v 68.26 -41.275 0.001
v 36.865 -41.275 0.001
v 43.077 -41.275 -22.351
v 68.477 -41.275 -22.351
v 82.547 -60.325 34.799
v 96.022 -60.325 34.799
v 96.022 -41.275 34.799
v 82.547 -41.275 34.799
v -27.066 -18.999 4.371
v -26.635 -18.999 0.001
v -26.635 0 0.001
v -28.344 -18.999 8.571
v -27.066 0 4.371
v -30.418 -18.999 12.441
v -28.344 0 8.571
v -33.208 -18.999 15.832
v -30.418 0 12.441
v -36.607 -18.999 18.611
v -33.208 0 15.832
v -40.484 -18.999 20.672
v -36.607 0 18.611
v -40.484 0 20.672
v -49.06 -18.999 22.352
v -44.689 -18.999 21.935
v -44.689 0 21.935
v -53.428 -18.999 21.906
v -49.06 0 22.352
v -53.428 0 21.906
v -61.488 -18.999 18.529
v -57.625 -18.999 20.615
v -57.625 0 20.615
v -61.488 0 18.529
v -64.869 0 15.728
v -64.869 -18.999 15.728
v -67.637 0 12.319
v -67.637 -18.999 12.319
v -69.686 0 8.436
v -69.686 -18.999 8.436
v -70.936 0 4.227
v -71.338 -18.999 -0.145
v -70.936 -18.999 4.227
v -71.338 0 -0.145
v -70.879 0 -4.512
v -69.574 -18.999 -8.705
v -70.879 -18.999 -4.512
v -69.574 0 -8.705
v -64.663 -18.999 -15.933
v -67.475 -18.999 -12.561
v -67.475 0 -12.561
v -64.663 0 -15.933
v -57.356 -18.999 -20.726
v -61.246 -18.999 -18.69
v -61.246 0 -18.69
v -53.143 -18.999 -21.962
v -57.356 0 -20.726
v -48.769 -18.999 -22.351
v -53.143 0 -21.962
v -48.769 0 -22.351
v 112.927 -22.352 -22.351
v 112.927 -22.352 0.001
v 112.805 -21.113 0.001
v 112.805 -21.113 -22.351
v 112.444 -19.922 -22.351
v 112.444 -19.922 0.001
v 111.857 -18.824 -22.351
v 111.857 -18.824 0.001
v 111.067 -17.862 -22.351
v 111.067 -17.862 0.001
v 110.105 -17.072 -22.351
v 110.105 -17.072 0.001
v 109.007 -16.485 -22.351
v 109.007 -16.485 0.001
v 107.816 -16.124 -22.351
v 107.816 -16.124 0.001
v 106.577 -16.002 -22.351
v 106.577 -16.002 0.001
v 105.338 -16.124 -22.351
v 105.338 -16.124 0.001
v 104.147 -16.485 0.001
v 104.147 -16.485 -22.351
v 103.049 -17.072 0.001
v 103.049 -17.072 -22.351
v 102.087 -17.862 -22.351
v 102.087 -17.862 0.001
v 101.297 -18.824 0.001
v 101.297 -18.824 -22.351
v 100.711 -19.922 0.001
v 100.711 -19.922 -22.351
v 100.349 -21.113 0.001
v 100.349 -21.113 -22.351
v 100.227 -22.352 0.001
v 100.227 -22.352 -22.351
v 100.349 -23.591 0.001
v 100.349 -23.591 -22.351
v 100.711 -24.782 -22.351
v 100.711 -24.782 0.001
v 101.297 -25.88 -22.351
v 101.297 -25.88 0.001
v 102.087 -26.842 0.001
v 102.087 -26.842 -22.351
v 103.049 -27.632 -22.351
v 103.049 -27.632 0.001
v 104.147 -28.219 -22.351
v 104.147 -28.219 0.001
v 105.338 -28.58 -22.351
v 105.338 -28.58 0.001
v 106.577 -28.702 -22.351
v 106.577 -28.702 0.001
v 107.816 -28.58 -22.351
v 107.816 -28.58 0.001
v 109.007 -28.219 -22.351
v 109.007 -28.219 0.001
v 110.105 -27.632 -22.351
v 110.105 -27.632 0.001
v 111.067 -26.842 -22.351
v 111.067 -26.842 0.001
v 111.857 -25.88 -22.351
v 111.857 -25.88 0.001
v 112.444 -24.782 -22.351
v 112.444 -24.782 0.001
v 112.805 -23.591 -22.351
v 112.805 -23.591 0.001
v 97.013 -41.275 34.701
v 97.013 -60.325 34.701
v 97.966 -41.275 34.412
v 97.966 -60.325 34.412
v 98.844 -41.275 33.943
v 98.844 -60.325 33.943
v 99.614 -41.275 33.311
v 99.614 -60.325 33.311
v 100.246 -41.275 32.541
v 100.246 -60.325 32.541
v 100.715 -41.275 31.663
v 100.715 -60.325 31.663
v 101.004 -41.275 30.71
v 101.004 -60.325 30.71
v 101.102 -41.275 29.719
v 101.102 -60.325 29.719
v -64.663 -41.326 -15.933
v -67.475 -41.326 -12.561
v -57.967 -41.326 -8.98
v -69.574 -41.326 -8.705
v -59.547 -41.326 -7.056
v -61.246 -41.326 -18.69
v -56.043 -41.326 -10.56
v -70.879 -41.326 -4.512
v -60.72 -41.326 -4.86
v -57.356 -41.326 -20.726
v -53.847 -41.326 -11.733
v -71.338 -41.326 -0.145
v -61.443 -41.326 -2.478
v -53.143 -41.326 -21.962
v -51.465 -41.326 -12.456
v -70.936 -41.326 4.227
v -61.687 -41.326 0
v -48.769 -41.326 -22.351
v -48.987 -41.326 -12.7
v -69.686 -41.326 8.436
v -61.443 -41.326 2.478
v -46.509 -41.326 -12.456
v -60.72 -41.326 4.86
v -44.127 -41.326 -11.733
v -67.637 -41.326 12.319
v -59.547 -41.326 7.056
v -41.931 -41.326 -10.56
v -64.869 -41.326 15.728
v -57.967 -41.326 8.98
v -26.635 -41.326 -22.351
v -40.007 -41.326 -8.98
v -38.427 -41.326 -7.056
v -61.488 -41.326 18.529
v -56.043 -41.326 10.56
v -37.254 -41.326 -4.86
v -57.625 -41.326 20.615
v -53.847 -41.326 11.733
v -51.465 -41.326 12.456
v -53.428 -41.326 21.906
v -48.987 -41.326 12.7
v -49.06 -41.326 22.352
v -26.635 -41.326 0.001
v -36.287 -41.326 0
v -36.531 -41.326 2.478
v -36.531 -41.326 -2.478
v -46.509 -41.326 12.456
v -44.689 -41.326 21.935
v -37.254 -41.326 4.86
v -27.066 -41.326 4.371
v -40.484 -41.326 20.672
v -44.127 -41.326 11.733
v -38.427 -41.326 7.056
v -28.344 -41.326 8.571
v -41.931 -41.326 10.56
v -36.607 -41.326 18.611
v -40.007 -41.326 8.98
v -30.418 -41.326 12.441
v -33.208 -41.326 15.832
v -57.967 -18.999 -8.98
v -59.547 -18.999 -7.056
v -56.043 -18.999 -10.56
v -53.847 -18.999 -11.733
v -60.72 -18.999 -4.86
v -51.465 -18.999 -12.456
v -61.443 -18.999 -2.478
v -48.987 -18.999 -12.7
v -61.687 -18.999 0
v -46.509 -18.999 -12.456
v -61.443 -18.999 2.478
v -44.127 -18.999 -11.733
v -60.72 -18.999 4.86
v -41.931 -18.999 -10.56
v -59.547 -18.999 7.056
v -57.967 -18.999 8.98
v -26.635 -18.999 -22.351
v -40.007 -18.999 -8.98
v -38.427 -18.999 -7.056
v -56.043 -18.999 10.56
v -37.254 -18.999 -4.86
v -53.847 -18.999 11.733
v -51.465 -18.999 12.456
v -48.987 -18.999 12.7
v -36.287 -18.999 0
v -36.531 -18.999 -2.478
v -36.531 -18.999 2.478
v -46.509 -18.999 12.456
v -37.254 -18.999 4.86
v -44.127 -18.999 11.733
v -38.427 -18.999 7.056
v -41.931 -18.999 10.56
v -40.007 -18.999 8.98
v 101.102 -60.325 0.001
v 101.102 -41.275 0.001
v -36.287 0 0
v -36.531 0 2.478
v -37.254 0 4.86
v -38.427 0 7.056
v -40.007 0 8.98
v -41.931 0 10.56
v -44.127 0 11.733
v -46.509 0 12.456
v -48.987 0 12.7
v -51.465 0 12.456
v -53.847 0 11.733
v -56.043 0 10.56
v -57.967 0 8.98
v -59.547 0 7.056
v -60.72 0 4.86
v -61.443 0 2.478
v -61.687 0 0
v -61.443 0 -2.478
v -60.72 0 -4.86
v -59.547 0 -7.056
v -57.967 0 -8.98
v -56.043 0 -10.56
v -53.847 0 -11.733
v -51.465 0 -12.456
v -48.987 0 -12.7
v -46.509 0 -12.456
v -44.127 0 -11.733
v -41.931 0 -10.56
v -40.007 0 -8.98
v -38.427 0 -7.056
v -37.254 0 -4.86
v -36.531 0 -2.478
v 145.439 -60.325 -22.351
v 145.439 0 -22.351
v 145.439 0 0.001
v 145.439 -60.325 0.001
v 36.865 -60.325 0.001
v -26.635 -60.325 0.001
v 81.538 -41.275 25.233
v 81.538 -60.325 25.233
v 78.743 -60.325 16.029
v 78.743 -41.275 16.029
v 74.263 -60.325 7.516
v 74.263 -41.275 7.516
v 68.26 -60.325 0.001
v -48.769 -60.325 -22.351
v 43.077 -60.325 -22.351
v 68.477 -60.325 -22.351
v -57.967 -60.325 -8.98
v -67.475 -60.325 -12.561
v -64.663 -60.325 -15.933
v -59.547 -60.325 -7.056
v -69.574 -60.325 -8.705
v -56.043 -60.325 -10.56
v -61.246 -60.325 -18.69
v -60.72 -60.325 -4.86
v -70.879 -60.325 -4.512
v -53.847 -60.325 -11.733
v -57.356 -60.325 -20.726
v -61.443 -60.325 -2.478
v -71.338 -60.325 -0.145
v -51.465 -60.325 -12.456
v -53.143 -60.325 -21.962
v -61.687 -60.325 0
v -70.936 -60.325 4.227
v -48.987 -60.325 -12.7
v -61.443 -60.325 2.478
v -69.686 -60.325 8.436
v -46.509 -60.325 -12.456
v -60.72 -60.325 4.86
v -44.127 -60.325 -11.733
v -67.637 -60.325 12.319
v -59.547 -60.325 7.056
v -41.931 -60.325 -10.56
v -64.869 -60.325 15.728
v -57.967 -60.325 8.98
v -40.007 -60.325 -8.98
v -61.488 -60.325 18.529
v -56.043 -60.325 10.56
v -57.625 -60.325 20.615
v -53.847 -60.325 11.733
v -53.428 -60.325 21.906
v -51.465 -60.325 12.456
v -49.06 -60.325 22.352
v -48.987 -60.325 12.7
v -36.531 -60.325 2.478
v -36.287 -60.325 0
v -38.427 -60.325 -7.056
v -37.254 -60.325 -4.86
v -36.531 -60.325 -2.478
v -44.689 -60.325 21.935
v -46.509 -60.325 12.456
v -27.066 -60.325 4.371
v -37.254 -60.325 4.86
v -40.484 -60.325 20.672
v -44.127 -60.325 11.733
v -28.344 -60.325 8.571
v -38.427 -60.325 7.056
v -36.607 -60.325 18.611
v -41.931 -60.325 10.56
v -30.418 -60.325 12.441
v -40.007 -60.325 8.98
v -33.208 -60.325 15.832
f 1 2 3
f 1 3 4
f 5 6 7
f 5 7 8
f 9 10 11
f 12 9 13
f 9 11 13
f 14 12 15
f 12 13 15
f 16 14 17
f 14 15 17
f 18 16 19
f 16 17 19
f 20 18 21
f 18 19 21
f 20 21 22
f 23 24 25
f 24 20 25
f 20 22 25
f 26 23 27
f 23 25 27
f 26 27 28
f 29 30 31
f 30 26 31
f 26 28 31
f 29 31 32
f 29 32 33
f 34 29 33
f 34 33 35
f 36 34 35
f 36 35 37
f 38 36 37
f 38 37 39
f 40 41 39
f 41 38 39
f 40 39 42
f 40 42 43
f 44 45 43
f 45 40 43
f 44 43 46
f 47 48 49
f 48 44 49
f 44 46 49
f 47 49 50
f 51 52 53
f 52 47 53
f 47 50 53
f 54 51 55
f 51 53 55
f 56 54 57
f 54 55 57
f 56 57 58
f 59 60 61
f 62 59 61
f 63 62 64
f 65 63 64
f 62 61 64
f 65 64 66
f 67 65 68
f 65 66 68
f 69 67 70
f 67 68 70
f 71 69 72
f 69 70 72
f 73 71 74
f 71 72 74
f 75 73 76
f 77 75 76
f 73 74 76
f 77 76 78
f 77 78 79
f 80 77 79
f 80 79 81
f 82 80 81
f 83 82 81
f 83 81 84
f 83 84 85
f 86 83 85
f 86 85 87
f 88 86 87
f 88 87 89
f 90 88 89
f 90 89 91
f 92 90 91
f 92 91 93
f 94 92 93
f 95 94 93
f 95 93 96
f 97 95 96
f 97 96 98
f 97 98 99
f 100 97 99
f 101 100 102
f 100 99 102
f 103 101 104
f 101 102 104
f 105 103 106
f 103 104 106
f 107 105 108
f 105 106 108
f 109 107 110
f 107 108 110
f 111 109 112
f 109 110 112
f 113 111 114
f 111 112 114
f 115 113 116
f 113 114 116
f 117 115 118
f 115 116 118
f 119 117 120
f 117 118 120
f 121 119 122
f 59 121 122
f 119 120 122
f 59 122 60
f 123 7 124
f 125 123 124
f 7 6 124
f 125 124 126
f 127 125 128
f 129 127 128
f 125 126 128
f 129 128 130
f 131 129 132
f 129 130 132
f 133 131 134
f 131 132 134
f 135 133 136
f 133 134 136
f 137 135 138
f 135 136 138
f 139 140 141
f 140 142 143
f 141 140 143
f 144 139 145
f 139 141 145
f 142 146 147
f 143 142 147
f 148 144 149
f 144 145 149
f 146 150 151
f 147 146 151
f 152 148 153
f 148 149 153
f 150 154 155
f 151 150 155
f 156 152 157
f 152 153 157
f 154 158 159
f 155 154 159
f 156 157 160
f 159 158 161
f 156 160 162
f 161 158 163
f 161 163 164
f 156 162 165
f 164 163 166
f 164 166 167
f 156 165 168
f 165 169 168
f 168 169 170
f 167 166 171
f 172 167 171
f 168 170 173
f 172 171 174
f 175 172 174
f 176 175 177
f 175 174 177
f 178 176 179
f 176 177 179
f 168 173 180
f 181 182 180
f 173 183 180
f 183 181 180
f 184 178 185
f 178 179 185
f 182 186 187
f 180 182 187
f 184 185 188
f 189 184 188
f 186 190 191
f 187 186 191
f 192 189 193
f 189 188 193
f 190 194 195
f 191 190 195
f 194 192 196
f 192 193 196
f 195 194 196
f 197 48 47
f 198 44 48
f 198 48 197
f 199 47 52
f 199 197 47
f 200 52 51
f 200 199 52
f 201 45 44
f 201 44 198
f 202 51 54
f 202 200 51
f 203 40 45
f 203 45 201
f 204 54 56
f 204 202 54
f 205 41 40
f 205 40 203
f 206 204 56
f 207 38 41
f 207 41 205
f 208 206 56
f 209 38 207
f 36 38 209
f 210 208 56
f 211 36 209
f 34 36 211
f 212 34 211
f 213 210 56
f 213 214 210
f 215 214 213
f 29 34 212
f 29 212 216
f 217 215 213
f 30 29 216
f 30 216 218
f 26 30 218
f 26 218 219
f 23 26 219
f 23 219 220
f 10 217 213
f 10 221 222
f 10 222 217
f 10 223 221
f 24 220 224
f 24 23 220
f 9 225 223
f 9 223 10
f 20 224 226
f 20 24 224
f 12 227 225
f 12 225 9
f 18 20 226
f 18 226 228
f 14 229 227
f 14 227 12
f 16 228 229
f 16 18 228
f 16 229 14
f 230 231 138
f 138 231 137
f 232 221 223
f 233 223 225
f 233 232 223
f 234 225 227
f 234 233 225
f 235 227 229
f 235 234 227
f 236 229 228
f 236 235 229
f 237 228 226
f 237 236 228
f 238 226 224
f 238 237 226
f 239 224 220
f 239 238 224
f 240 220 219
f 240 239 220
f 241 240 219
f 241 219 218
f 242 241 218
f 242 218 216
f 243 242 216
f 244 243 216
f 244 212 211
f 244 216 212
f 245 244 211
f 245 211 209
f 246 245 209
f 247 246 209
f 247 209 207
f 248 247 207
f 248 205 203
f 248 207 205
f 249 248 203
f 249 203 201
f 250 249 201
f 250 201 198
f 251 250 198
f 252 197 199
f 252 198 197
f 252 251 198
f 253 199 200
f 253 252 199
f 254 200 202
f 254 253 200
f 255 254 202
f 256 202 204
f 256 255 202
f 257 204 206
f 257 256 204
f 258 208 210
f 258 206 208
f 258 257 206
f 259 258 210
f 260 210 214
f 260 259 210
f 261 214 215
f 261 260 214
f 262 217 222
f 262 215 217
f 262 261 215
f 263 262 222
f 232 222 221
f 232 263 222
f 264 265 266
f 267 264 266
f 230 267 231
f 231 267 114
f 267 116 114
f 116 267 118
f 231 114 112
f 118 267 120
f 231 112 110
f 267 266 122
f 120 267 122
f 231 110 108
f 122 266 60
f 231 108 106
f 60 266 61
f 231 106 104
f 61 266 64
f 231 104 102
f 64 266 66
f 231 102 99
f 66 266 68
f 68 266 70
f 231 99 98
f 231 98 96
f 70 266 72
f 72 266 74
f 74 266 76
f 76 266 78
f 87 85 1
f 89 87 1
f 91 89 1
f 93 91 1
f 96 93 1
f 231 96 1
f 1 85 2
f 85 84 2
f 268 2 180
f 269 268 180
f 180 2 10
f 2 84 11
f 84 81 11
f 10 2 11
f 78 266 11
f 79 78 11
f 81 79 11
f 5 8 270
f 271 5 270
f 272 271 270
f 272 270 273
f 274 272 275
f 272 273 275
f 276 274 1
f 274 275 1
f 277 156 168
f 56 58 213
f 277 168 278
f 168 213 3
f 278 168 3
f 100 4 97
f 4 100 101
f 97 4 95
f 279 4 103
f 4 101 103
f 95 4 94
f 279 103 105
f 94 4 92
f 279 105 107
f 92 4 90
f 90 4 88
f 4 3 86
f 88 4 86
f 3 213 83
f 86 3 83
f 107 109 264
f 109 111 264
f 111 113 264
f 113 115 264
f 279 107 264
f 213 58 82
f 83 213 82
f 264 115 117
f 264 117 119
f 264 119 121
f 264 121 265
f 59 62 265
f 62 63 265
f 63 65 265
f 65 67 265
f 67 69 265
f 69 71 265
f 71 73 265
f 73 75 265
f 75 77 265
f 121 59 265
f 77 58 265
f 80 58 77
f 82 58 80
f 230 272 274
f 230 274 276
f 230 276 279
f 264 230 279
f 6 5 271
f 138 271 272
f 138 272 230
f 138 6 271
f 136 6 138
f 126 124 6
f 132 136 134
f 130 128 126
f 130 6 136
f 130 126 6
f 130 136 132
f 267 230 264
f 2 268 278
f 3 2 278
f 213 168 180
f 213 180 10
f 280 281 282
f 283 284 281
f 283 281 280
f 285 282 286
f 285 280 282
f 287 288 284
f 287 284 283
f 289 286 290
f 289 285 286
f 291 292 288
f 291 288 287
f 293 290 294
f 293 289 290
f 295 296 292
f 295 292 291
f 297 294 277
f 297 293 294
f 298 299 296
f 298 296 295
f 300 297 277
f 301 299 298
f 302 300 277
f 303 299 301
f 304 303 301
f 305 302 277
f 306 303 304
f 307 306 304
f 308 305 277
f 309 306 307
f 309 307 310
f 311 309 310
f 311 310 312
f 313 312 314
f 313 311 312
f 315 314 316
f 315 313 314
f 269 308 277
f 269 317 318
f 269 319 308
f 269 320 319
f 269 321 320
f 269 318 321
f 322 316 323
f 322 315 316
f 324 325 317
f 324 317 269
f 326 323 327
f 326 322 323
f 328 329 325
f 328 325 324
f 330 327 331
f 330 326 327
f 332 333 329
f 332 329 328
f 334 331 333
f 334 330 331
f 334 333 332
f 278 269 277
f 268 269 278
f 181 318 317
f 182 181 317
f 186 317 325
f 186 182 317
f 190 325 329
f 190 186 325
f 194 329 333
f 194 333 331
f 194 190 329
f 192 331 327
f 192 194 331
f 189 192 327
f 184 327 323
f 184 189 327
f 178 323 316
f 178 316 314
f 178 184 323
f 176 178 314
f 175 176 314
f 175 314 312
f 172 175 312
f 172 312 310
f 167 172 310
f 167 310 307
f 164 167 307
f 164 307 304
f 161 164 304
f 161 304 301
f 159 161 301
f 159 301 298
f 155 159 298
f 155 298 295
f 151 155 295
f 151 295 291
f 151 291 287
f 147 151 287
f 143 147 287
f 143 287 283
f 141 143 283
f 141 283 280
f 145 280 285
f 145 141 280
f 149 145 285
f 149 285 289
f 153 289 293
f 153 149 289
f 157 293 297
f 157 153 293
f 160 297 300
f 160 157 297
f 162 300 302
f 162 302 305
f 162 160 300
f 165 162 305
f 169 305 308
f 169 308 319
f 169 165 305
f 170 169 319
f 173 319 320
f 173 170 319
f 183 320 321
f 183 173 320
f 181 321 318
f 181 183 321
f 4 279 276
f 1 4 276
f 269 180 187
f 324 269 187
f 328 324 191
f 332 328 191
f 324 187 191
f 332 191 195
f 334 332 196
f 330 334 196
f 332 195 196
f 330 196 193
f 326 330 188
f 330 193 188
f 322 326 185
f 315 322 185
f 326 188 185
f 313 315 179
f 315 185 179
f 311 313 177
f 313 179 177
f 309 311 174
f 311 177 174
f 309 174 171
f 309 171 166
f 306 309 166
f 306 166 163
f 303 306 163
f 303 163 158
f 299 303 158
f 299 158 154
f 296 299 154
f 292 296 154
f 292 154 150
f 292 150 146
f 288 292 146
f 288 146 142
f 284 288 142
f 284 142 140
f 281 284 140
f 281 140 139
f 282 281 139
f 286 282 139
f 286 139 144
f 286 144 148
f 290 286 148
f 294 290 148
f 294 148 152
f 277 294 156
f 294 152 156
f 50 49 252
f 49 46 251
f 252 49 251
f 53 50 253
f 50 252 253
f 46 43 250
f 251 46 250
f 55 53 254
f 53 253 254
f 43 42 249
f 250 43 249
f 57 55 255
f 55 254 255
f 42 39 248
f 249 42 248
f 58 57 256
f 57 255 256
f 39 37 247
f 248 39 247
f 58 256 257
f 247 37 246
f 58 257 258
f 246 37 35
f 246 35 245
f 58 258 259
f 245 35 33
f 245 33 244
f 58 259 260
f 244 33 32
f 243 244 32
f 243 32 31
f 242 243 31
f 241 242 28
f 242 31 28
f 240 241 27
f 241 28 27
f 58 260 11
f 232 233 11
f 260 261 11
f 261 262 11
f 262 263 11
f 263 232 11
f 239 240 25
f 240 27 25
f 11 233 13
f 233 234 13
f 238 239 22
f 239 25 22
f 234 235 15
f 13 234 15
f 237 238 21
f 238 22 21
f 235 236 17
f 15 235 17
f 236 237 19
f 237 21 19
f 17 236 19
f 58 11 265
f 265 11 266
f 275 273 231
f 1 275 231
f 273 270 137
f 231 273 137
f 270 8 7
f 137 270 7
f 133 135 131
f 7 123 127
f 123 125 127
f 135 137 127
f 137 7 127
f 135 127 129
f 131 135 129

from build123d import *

# Parameters (mm, degrees)
F0_R           = 12.7
F1_DEPTH       = 60.325
F2_DEPTH       = 25.4
F4_DEPTH       = 19.05
F5_DEPTH       = 41.275
F6_R           = 5.08
F7_R           = 6.35
F8_DEPTH       = 25.4
F9_W           = 44.704
F9_H           = 22.3266
F10_DEPTH      = 25.4
F10_DEPTH_BACK = 25.4


with BuildPart() as f1:
    # F0 (on Front) → F1 (new body)
    with BuildSketch(Plane.XZ):
        with BuildLine():
            Line((36.865121601, 0.0010602231), (-26.6348784242, 0.0010602231))
            ThreePointArc((-26.6348784242, 0.0010602231), (-64.8692857058, 15.7277157318), (-48.7691742678, -22.3509397769))
            Line((-48.7691742678, -22.3509397769), (43.0772257322, -22.3509397769))
            Line((43.0772257322, -22.3509397769), (36.865121601, 0.0010602231))
        make_face()
        with Locations((-48.986878399, 0)):
            Circle(F0_R, mode=Mode.SUBTRACT)
        Polygon((68.259521601, 0.0010602231), (36.865121601, 0.0010602231), (43.0772257322, -22.3509397769), (68.4772257322, -22.3509397769), align=None)
        with BuildLine():
            ThreePointArc((82.5471727442, 34.7990602231), (78.7429689335, 16.0288506516), (68.259521601, 0.0010602231))
            Line((68.259521601, 0.0010602231), (101.101721601, 0.0010602231))
            Line((101.101721601, 0.0010602231), (101.101721601, 34.7990602231))
            Line((101.101721601, 34.7990602231), (82.5471727442, 34.7990602231))
        make_face()
        Polygon((101.101721601, 0.0010602231), (68.259521601, 0.0010602231), (68.4772257322, -22.3509397769), (145.4392257322, -22.3509397769), (145.4392257322, 0.0010602231), (145.2215215758, 0.0010602231), align=None)
    extrude(amount=F1_DEPTH)

    # F0 (on Front) → F2 (join)
    with BuildSketch(Plane.XZ):
        with BuildLine():
            Line((36.865121601, 0.0010602231), (-26.6348784242, 0.0010602231))
            ThreePointArc((-26.6348784242, 0.0010602231), (-64.8692857058, 15.7277157318), (-48.7691742678, -22.3509397769))
            Line((-48.7691742678, -22.3509397769), (43.0772257322, -22.3509397769))
            Line((43.0772257322, -22.3509397769), (36.865121601, 0.0010602231))
        make_face()
        with Locations((-48.986878399, 0)):
            Circle(F0_R, mode=Mode.SUBTRACT)
        Polygon((68.259521601, 0.0010602231), (36.865121601, 0.0010602231), (43.0772257322, -22.3509397769), (68.4772257322, -22.3509397769), align=None)
        with BuildLine():
            ThreePointArc((82.5471727442, 34.7990602231), (78.7429689335, 16.0288506516), (68.259521601, 0.0010602231))
            Line((68.259521601, 0.0010602231), (101.101721601, 0.0010602231))
            Line((101.101721601, 0.0010602231), (101.101721601, 34.7990602231))
            Line((101.101721601, 34.7990602231), (82.5471727442, 34.7990602231))
        make_face()
        Polygon((101.101721601, 0.0010602231), (68.259521601, 0.0010602231), (68.4772257322, -22.3509397769), (145.4392257322, -22.3509397769), (145.4392257322, 0.0010602231), (145.2215215758, 0.0010602231), align=None)
    extrude(amount=F2_DEPTH)

    # F3 (on face) → F4 (cut)
    with BuildSketch(Plane.XZ.offset(60.325)):
        Polygon((68.259521601, 0.0010602231), (36.865121601, 0.0010602231), (43.0772257322, -22.3509397769), (68.4772257322, -22.3509397769), align=None)
    extrude(amount=-F4_DEPTH, mode=Mode.SUBTRACT)

    # F0 (on Front) → F5 (cut)
    with BuildSketch(Plane.XZ):
        with BuildLine():
            ThreePointArc((82.5471727442, 34.7990602231), (78.7429689335, 16.0288506516), (68.259521601, 0.0010602231))
            Line((68.259521601, 0.0010602231), (101.101721601, 0.0010602231))
            Line((101.101721601, 0.0010602231), (101.101721601, 34.7990602231))
            Line((101.101721601, 34.7990602231), (82.5471727442, 34.7990602231))
        make_face()
    extrude(amount=F5_DEPTH, mode=Mode.SUBTRACT)

    # F6
    f6_edges = [f1.edges().sort_by_distance(p)[0] for p in [
        (101.101722, -50.8, 34.79906),
    ]]
    fillet(f6_edges, radius=F6_R)

    # F7 (on face) → F8 (cut)
    with BuildSketch(Plane.XY.offset(0.0010602231)):
        with Locations((106.5772257322, -22.352)):
            Circle(F7_R)
    extrude(amount=-F8_DEPTH, mode=Mode.SUBTRACT)

    # F9 (on Top) → F10 (cut, two sides)
    with BuildSketch(Plane.XY) as f10_sk:
        with Locations((-48.9868784242, -30.1625)):
            Rectangle(F9_W, F9_H)
    extrude(amount=F10_DEPTH, mode=Mode.SUBTRACT)
    extrude(f10_sk.sketch, amount=-F10_DEPTH_BACK, mode=Mode.SUBTRACT)


solid = f1.part
